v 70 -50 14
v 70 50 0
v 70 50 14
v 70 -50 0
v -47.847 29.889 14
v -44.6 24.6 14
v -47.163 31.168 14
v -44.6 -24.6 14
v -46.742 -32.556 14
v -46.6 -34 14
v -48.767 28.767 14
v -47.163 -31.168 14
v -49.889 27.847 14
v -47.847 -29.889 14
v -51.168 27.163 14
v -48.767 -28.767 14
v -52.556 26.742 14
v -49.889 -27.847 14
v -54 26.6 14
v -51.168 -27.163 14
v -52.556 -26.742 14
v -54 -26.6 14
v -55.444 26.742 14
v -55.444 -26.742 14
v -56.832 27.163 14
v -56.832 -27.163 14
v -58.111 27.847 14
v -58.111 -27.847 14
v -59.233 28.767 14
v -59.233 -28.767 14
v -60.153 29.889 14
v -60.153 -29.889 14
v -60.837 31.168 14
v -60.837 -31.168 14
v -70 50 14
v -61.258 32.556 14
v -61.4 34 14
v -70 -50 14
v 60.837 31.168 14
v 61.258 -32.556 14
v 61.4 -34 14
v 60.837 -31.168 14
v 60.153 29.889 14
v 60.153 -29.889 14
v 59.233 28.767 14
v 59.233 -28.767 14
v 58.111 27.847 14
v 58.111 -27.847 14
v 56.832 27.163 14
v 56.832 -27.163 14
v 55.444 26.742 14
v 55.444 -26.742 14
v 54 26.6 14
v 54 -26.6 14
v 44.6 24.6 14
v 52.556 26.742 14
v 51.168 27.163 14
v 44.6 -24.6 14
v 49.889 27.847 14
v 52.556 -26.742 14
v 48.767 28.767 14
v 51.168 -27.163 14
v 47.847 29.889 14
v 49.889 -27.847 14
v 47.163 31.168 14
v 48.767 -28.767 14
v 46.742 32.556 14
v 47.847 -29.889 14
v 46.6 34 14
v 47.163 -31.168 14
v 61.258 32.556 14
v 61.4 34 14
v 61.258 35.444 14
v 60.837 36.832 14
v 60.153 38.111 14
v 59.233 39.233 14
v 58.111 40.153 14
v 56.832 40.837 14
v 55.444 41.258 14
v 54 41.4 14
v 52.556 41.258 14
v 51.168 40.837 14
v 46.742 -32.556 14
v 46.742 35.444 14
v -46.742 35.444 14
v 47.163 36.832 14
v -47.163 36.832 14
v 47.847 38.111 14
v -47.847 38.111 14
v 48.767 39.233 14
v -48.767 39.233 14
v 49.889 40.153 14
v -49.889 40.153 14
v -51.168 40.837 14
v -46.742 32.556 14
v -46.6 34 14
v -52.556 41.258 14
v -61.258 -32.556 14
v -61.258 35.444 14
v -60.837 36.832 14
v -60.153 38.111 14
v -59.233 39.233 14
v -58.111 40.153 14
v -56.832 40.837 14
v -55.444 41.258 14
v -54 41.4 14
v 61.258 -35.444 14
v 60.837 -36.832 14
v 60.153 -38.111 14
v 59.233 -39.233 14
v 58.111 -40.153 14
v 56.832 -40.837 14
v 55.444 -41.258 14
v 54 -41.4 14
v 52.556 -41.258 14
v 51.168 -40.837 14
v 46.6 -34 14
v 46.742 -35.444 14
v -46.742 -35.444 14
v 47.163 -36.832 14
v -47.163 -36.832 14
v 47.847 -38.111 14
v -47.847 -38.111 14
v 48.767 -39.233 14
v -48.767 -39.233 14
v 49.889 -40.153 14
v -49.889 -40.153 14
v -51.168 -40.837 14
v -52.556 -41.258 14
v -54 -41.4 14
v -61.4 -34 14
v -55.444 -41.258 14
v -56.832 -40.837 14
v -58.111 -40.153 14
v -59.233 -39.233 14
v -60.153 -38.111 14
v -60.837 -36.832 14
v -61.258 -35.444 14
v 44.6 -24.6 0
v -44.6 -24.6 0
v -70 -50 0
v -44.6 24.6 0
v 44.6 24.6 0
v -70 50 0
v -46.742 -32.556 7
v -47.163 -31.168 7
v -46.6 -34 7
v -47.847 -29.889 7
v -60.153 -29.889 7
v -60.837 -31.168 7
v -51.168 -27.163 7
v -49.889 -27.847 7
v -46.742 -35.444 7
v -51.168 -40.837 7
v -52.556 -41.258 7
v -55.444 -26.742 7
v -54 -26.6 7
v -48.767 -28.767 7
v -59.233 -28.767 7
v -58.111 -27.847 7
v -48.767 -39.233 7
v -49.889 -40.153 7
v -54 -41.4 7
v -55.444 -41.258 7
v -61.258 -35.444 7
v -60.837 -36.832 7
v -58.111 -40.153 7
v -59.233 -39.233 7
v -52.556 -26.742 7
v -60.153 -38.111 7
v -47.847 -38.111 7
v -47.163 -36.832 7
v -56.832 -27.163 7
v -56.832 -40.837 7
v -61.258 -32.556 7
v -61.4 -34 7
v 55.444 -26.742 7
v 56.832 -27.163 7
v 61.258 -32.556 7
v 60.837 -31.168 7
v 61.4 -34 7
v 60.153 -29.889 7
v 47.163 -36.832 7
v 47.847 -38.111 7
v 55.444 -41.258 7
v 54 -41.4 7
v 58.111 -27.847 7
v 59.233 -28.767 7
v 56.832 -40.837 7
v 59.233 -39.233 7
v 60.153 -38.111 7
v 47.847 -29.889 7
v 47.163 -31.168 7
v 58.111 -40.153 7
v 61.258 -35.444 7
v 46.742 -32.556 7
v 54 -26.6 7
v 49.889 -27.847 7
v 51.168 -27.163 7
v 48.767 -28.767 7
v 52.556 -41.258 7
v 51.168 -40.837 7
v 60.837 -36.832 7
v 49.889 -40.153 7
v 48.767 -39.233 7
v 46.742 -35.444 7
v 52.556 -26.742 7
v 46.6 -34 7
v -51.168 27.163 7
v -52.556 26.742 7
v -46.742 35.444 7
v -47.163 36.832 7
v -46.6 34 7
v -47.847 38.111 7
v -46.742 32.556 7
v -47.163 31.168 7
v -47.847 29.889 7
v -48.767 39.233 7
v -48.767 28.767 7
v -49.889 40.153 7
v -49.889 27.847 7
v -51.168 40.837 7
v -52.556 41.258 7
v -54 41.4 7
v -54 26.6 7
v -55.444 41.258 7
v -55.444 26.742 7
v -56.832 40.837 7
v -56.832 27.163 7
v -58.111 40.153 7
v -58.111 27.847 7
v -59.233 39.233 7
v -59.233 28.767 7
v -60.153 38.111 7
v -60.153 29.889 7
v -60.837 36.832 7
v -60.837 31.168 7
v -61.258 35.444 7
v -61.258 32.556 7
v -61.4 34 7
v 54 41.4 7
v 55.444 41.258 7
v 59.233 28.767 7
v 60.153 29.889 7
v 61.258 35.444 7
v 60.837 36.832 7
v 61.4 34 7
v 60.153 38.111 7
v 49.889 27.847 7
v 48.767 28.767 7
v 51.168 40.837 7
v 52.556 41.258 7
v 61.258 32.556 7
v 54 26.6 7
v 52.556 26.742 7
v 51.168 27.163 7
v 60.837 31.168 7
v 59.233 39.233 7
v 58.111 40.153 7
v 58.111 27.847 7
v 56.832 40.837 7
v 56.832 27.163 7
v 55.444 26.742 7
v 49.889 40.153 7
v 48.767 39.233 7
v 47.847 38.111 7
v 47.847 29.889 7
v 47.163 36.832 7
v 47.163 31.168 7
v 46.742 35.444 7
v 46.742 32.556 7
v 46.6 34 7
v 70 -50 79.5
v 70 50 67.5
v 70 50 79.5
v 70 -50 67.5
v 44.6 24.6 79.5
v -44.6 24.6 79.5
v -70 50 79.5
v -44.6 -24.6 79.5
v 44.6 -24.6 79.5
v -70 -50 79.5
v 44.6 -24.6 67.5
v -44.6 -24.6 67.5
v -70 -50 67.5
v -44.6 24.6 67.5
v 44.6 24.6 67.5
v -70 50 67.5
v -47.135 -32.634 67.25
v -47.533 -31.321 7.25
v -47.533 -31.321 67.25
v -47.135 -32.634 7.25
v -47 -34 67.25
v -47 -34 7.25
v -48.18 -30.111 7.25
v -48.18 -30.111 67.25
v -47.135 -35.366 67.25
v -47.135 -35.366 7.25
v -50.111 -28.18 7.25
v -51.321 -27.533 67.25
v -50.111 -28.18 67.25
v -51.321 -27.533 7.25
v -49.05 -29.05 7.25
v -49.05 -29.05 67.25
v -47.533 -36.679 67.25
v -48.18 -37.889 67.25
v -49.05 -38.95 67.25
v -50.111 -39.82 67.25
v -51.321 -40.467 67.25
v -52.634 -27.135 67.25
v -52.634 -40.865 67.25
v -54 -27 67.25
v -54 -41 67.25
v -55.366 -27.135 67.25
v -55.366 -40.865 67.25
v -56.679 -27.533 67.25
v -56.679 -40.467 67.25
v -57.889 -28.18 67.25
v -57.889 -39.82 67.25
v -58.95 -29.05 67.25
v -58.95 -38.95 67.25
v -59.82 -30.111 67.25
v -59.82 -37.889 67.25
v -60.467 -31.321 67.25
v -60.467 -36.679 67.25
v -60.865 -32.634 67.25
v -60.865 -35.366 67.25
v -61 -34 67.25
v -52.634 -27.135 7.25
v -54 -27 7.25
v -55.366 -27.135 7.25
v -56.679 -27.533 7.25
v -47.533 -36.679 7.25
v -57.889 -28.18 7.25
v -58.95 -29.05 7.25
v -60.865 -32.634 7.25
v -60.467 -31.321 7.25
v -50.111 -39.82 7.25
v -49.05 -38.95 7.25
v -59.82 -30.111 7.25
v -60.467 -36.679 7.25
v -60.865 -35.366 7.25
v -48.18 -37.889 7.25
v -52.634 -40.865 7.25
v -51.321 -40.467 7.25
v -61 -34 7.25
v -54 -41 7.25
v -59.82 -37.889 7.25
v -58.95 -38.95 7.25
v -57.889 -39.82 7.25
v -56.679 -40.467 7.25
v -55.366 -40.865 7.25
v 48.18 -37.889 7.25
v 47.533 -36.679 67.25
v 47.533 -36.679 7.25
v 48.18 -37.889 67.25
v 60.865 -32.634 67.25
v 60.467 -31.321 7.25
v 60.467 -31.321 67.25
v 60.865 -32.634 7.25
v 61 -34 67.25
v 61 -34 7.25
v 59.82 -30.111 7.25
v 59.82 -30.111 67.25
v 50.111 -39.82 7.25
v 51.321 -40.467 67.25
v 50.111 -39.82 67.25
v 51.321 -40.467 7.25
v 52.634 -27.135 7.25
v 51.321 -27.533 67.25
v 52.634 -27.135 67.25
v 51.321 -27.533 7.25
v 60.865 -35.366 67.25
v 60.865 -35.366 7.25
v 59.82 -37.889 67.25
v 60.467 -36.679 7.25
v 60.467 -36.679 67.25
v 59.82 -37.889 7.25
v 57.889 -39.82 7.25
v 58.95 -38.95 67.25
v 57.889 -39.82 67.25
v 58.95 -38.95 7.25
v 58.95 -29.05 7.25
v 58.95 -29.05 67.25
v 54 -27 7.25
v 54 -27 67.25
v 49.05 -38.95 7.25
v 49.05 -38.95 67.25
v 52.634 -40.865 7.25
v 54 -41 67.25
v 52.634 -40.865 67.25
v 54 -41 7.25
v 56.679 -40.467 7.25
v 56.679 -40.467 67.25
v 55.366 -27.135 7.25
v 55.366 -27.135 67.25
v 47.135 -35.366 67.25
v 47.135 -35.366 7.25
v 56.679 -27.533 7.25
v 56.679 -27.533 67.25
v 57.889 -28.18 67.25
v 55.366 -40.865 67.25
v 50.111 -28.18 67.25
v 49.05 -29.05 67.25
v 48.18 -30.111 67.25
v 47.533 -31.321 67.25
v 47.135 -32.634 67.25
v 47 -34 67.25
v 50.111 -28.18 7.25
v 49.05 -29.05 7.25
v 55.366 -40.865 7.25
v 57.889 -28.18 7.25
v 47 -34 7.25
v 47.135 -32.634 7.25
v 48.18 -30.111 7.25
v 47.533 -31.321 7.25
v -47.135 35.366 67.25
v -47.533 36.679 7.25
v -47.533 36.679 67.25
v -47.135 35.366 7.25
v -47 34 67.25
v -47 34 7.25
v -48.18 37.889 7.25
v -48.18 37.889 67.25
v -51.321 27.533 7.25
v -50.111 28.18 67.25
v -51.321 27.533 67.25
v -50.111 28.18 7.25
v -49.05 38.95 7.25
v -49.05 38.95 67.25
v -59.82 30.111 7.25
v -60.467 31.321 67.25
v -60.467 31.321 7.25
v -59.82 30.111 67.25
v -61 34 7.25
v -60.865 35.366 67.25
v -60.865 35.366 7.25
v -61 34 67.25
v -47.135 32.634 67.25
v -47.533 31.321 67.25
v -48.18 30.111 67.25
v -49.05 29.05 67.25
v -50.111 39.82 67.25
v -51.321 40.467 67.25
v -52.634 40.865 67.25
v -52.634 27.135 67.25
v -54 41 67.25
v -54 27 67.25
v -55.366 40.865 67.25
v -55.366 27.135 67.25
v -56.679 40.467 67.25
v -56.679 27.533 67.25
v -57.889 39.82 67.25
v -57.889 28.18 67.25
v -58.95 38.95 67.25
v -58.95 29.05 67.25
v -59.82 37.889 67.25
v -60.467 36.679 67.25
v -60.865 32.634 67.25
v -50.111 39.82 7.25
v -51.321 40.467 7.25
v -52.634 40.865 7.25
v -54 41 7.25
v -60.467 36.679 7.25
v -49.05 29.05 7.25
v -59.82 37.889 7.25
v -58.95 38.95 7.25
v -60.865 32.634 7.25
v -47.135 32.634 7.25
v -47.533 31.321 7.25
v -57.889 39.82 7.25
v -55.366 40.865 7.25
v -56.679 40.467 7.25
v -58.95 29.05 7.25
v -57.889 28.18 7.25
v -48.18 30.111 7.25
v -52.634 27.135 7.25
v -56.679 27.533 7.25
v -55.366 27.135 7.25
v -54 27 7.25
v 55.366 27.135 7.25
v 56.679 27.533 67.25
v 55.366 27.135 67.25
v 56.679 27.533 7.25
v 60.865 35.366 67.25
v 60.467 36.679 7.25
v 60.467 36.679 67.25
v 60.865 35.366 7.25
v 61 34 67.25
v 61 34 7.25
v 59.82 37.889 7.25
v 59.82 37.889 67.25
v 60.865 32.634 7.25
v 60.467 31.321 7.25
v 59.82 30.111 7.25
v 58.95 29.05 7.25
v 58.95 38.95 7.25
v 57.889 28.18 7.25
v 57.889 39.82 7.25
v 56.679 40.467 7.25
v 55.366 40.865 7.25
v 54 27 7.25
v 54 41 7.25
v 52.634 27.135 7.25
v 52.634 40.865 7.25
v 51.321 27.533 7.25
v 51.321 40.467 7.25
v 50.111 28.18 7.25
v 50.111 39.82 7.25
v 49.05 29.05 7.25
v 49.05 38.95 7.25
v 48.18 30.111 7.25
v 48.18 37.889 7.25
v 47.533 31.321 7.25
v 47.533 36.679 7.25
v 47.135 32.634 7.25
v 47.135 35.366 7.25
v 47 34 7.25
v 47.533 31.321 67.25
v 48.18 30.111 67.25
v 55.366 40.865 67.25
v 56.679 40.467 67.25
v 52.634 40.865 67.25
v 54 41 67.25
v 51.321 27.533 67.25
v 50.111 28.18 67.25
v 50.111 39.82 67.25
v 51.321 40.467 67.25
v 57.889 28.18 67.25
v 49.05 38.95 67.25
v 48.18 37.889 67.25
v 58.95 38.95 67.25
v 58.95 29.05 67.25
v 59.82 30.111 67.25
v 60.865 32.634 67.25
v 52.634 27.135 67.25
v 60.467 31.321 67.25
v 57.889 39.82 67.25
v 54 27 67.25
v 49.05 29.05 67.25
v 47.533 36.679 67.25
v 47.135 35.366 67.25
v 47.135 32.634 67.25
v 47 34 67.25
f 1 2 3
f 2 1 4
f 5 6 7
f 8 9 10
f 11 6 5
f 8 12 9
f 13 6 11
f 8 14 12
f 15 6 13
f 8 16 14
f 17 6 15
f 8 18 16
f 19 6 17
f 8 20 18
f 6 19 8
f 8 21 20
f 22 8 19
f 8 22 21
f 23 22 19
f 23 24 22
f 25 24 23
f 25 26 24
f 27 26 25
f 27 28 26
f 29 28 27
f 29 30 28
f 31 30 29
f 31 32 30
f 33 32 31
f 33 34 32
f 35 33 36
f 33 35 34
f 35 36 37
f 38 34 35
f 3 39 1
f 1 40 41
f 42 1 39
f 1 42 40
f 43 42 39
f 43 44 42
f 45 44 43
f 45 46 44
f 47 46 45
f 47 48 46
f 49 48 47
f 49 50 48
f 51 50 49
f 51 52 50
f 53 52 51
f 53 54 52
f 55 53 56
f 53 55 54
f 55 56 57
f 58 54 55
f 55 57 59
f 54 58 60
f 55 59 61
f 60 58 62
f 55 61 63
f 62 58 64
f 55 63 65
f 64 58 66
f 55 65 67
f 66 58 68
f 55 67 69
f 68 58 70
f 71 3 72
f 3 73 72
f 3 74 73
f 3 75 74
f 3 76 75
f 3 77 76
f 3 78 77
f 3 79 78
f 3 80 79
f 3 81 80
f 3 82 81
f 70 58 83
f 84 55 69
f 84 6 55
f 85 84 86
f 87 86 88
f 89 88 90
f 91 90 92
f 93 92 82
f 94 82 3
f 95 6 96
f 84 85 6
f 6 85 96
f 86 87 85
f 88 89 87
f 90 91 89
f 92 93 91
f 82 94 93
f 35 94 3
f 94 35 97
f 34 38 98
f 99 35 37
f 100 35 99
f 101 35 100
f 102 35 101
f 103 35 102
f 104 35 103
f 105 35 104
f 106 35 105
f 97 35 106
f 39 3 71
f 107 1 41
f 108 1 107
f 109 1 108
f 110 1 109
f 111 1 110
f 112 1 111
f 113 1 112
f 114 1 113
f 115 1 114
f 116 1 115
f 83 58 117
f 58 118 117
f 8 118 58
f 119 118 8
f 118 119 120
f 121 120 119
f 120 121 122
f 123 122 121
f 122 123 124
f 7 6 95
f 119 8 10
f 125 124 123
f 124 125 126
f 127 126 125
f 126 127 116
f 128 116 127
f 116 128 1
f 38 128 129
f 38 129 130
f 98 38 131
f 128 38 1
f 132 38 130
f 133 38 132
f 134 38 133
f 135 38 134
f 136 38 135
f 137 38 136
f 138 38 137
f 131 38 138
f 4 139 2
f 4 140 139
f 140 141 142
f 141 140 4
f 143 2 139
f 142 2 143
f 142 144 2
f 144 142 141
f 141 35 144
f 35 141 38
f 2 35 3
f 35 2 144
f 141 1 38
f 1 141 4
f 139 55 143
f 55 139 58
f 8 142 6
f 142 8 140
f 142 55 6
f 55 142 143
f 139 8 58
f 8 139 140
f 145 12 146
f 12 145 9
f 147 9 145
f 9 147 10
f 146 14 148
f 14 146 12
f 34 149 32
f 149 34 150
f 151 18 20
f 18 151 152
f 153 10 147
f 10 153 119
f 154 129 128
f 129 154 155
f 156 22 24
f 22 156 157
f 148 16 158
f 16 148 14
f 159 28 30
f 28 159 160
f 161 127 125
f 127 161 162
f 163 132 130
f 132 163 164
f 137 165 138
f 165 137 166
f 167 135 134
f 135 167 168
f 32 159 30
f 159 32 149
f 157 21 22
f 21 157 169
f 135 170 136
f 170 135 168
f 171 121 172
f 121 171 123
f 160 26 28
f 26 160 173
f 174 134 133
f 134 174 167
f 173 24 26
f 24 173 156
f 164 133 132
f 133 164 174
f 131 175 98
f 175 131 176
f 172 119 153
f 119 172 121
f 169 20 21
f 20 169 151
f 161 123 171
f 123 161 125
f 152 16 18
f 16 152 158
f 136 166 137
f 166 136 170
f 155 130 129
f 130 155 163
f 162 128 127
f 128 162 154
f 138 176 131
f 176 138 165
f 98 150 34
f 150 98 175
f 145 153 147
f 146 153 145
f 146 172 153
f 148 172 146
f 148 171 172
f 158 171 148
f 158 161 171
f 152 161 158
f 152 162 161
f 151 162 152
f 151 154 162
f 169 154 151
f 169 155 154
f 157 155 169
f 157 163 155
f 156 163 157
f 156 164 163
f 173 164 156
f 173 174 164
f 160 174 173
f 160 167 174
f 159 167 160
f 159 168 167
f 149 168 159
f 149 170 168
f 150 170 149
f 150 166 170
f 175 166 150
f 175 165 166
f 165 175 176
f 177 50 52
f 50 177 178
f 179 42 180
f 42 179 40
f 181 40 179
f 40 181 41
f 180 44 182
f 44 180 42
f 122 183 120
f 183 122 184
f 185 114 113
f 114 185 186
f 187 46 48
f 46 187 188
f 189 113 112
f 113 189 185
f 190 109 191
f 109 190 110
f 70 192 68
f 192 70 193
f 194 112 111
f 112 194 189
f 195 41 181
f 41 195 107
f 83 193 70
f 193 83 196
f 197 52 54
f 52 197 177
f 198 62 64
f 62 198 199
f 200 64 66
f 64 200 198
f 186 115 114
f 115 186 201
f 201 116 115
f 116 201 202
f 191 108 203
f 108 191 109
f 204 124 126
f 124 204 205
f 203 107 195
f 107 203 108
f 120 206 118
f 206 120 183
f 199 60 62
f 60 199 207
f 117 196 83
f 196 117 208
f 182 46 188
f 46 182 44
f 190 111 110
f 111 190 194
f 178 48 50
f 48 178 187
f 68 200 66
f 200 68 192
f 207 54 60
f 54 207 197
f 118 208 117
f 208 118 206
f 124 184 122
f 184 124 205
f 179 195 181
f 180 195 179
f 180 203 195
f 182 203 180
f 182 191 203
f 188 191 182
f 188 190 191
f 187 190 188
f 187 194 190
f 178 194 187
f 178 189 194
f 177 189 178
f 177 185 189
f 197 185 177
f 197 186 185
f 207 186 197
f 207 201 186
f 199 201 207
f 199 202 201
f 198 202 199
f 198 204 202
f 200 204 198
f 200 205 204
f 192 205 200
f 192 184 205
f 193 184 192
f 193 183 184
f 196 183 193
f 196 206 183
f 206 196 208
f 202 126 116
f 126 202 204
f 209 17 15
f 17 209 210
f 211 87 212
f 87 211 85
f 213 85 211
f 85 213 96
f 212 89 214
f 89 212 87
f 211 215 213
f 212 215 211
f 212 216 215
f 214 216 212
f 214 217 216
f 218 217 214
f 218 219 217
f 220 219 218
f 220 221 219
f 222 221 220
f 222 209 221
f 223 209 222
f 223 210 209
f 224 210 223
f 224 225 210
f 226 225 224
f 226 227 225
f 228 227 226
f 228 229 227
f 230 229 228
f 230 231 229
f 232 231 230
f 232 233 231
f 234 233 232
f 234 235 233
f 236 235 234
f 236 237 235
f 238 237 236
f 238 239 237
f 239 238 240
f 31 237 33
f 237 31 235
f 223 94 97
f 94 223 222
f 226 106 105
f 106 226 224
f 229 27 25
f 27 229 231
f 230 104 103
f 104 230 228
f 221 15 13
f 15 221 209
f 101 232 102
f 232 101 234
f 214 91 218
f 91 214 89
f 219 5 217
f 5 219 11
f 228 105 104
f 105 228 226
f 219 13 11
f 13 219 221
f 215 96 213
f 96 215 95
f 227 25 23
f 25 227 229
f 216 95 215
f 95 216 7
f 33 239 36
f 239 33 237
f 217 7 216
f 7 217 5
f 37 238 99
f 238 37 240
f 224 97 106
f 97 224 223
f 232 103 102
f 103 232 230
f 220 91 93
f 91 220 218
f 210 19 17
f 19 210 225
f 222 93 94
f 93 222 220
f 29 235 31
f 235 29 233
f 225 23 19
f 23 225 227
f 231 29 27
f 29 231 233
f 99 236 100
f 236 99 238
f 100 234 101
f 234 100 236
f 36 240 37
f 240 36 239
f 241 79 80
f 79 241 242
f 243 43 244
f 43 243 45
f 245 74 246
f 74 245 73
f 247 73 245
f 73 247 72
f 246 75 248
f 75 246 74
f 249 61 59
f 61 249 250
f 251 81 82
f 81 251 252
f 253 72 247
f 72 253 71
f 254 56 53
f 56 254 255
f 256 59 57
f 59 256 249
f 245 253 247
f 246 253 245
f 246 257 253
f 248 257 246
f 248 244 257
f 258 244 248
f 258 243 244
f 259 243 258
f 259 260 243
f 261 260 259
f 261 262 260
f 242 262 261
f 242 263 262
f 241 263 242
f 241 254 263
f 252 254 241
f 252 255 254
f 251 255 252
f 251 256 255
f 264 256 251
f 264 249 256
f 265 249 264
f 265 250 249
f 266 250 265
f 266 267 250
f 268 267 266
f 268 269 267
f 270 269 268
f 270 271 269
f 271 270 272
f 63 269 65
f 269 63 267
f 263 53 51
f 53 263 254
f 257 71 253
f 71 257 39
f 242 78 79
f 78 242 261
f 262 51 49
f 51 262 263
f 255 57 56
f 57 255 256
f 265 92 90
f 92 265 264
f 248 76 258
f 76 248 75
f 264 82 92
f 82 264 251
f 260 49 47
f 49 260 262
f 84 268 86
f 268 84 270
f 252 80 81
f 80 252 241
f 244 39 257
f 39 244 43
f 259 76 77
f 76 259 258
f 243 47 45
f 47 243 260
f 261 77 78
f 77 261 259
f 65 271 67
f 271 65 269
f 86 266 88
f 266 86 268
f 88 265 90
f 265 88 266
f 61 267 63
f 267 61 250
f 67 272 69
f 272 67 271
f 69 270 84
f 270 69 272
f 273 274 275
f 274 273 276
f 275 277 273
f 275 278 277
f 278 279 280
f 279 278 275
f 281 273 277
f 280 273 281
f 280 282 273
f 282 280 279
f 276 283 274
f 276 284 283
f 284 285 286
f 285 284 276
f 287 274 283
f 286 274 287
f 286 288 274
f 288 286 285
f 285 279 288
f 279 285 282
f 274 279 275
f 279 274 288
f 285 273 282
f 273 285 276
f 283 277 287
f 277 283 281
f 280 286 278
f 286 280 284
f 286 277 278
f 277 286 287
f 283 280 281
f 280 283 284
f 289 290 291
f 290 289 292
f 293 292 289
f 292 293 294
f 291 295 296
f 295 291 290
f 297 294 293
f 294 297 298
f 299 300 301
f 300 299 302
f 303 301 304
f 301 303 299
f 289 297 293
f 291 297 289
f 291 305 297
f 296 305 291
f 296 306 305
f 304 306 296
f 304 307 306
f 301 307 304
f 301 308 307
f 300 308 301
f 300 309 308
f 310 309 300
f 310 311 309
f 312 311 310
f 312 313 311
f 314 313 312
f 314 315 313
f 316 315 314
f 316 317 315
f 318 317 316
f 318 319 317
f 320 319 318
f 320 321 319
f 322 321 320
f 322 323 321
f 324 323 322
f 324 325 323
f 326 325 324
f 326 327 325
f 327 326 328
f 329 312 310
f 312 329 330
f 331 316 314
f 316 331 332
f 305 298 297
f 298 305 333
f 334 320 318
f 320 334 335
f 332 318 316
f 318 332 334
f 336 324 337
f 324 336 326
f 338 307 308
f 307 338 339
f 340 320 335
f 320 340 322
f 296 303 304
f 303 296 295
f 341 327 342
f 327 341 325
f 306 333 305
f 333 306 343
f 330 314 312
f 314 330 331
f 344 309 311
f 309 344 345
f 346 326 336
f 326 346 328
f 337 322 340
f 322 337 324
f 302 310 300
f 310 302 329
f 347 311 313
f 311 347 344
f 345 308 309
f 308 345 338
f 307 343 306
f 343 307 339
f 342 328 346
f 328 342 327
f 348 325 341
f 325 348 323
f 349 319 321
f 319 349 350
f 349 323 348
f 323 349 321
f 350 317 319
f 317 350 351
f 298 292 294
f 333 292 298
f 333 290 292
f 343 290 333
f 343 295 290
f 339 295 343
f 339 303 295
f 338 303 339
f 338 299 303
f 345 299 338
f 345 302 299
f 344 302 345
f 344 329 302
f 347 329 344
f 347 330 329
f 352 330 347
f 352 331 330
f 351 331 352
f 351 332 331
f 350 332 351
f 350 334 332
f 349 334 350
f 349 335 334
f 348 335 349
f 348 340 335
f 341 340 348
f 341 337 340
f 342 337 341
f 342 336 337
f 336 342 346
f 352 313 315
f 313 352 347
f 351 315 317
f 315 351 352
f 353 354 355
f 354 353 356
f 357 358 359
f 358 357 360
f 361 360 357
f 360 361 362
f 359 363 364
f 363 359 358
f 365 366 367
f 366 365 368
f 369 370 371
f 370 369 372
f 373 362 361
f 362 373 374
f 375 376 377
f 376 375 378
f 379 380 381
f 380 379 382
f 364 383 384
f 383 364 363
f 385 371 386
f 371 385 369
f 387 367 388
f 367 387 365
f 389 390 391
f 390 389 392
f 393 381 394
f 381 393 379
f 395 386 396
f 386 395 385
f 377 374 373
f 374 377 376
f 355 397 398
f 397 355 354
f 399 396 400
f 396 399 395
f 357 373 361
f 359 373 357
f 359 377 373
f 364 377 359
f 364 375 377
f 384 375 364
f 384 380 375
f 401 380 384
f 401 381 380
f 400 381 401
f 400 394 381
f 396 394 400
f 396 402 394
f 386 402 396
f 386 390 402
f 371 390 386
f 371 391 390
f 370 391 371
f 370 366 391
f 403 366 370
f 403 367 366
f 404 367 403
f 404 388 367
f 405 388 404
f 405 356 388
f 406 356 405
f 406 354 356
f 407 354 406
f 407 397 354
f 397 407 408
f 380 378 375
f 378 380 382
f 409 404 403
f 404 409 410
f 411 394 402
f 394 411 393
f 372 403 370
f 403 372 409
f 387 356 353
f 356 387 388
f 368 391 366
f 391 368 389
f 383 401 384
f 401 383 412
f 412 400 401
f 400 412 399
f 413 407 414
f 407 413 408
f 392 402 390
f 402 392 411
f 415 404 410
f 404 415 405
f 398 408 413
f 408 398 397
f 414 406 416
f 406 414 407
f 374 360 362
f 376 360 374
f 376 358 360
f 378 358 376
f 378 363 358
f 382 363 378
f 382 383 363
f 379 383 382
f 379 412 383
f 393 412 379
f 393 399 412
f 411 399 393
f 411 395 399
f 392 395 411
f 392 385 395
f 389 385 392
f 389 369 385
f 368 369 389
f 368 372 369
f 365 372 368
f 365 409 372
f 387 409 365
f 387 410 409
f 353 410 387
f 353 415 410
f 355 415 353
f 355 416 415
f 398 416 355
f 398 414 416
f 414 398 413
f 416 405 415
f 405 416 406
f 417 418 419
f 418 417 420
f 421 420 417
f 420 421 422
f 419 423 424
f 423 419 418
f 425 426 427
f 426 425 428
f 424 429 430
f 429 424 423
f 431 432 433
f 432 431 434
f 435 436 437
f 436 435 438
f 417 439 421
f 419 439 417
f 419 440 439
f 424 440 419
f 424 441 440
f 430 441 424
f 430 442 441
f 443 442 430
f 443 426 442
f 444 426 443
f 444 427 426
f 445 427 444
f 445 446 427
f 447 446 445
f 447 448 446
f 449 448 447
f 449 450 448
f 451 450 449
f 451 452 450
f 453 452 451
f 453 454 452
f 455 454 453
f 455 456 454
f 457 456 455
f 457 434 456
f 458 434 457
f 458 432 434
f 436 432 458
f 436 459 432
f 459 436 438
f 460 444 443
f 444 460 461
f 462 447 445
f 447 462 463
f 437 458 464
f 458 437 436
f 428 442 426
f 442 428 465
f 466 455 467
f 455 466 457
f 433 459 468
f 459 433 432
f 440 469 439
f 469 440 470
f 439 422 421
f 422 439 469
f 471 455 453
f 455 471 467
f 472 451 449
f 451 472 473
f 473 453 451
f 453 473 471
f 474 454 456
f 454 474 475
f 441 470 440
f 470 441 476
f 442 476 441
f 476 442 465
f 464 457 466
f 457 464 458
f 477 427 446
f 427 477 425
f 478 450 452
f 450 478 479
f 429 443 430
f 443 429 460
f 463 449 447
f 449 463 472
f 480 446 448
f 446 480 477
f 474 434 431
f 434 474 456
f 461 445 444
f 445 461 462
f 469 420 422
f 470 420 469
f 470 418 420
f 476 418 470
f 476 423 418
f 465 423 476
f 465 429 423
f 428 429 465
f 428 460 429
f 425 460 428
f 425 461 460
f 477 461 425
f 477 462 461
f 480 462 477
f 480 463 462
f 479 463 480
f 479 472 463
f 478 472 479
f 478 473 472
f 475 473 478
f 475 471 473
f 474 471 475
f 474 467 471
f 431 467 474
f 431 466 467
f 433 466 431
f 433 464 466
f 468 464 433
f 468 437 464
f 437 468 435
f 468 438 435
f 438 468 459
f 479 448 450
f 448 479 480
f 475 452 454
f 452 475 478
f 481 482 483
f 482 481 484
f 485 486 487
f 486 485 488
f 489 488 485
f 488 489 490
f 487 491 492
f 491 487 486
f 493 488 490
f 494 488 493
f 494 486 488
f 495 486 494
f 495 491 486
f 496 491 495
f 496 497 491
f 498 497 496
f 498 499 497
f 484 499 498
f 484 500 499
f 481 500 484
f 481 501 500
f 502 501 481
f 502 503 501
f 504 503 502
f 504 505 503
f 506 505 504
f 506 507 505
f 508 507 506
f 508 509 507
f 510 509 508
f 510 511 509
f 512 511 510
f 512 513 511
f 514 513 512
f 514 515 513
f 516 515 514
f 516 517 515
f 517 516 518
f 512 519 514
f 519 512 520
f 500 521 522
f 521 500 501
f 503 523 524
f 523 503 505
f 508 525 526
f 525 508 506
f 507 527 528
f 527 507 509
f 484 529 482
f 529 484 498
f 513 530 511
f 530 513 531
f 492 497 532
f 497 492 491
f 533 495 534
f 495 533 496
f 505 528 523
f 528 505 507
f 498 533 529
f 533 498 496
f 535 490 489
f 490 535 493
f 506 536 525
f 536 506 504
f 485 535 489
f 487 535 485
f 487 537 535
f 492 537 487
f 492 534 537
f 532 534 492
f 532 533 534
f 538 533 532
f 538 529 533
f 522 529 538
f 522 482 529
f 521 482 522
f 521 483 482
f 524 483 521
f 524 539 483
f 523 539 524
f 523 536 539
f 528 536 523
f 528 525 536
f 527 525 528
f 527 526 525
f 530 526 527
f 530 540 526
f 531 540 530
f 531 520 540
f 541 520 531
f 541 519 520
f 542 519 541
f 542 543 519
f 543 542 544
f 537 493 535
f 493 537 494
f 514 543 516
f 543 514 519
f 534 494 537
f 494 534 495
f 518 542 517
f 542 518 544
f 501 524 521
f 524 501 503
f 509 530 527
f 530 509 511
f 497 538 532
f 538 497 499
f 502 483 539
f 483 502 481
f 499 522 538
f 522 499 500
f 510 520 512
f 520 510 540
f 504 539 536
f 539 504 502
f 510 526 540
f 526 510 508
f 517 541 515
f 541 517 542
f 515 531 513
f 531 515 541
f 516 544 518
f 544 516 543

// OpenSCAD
$fn = 32;

// ------------------------------------------------------------------------
// Frame cube: base 140 x 100 mm, posts 60 mm tall
// Every part is its own module, assembly() places every instance.
// ------------------------------------------------------------------------

// --- part 1 ---
module base_frame() {
  difference() {
    translate([-70, -50, 0]) cube([140, 100, 14]);
    translate([-44.6, -24.6, -1]) cube([89.2, 49.2, 16]);
    translate([-54, -34, 7]) cylinder(h = 8, d = 14.8);
    translate([54, -34, 7]) cylinder(h = 8, d = 14.8);
    translate([-54, 34, 7]) cylinder(h = 8, d = 14.8);
    translate([54, 34, 7]) cylinder(h = 8, d = 14.8);
  }
}

// --- part 2 ---
module corner_post() {
  cylinder(h = 60, d = 14);
}

// --- part 3 ---
module top_frame() {
  difference() {
    translate([-70, -50, 0]) cube([140, 100, 12]);
    translate([-44.6, -24.6, -1]) cube([89.2, 49.2, 14]);
  }
}

// --- assembly ---
module assembly() {
  color([0.80, 0.24, 0.20]) translate([0, 0, 0]) rotate([0, 0, 0]) base_frame();
  color([0.20, 0.45, 0.75]) translate([-54, -34, 7.25]) rotate([0, 0, 0]) corner_post();
  color([0.25, 0.62, 0.32]) translate([54, -34, 7.25]) rotate([0, 0, 0]) corner_post();
  color([0.92, 0.70, 0.18]) translate([-54, 34, 7.25]) rotate([0, 0, 0]) corner_post();
  color([0.58, 0.35, 0.70]) translate([54, 34, 7.25]) rotate([0, 0, 0]) corner_post();
  color([0.16, 0.66, 0.66]) translate([0, 0, 67.5]) rotate([0, 0, 0]) top_frame();
}

assembly();
